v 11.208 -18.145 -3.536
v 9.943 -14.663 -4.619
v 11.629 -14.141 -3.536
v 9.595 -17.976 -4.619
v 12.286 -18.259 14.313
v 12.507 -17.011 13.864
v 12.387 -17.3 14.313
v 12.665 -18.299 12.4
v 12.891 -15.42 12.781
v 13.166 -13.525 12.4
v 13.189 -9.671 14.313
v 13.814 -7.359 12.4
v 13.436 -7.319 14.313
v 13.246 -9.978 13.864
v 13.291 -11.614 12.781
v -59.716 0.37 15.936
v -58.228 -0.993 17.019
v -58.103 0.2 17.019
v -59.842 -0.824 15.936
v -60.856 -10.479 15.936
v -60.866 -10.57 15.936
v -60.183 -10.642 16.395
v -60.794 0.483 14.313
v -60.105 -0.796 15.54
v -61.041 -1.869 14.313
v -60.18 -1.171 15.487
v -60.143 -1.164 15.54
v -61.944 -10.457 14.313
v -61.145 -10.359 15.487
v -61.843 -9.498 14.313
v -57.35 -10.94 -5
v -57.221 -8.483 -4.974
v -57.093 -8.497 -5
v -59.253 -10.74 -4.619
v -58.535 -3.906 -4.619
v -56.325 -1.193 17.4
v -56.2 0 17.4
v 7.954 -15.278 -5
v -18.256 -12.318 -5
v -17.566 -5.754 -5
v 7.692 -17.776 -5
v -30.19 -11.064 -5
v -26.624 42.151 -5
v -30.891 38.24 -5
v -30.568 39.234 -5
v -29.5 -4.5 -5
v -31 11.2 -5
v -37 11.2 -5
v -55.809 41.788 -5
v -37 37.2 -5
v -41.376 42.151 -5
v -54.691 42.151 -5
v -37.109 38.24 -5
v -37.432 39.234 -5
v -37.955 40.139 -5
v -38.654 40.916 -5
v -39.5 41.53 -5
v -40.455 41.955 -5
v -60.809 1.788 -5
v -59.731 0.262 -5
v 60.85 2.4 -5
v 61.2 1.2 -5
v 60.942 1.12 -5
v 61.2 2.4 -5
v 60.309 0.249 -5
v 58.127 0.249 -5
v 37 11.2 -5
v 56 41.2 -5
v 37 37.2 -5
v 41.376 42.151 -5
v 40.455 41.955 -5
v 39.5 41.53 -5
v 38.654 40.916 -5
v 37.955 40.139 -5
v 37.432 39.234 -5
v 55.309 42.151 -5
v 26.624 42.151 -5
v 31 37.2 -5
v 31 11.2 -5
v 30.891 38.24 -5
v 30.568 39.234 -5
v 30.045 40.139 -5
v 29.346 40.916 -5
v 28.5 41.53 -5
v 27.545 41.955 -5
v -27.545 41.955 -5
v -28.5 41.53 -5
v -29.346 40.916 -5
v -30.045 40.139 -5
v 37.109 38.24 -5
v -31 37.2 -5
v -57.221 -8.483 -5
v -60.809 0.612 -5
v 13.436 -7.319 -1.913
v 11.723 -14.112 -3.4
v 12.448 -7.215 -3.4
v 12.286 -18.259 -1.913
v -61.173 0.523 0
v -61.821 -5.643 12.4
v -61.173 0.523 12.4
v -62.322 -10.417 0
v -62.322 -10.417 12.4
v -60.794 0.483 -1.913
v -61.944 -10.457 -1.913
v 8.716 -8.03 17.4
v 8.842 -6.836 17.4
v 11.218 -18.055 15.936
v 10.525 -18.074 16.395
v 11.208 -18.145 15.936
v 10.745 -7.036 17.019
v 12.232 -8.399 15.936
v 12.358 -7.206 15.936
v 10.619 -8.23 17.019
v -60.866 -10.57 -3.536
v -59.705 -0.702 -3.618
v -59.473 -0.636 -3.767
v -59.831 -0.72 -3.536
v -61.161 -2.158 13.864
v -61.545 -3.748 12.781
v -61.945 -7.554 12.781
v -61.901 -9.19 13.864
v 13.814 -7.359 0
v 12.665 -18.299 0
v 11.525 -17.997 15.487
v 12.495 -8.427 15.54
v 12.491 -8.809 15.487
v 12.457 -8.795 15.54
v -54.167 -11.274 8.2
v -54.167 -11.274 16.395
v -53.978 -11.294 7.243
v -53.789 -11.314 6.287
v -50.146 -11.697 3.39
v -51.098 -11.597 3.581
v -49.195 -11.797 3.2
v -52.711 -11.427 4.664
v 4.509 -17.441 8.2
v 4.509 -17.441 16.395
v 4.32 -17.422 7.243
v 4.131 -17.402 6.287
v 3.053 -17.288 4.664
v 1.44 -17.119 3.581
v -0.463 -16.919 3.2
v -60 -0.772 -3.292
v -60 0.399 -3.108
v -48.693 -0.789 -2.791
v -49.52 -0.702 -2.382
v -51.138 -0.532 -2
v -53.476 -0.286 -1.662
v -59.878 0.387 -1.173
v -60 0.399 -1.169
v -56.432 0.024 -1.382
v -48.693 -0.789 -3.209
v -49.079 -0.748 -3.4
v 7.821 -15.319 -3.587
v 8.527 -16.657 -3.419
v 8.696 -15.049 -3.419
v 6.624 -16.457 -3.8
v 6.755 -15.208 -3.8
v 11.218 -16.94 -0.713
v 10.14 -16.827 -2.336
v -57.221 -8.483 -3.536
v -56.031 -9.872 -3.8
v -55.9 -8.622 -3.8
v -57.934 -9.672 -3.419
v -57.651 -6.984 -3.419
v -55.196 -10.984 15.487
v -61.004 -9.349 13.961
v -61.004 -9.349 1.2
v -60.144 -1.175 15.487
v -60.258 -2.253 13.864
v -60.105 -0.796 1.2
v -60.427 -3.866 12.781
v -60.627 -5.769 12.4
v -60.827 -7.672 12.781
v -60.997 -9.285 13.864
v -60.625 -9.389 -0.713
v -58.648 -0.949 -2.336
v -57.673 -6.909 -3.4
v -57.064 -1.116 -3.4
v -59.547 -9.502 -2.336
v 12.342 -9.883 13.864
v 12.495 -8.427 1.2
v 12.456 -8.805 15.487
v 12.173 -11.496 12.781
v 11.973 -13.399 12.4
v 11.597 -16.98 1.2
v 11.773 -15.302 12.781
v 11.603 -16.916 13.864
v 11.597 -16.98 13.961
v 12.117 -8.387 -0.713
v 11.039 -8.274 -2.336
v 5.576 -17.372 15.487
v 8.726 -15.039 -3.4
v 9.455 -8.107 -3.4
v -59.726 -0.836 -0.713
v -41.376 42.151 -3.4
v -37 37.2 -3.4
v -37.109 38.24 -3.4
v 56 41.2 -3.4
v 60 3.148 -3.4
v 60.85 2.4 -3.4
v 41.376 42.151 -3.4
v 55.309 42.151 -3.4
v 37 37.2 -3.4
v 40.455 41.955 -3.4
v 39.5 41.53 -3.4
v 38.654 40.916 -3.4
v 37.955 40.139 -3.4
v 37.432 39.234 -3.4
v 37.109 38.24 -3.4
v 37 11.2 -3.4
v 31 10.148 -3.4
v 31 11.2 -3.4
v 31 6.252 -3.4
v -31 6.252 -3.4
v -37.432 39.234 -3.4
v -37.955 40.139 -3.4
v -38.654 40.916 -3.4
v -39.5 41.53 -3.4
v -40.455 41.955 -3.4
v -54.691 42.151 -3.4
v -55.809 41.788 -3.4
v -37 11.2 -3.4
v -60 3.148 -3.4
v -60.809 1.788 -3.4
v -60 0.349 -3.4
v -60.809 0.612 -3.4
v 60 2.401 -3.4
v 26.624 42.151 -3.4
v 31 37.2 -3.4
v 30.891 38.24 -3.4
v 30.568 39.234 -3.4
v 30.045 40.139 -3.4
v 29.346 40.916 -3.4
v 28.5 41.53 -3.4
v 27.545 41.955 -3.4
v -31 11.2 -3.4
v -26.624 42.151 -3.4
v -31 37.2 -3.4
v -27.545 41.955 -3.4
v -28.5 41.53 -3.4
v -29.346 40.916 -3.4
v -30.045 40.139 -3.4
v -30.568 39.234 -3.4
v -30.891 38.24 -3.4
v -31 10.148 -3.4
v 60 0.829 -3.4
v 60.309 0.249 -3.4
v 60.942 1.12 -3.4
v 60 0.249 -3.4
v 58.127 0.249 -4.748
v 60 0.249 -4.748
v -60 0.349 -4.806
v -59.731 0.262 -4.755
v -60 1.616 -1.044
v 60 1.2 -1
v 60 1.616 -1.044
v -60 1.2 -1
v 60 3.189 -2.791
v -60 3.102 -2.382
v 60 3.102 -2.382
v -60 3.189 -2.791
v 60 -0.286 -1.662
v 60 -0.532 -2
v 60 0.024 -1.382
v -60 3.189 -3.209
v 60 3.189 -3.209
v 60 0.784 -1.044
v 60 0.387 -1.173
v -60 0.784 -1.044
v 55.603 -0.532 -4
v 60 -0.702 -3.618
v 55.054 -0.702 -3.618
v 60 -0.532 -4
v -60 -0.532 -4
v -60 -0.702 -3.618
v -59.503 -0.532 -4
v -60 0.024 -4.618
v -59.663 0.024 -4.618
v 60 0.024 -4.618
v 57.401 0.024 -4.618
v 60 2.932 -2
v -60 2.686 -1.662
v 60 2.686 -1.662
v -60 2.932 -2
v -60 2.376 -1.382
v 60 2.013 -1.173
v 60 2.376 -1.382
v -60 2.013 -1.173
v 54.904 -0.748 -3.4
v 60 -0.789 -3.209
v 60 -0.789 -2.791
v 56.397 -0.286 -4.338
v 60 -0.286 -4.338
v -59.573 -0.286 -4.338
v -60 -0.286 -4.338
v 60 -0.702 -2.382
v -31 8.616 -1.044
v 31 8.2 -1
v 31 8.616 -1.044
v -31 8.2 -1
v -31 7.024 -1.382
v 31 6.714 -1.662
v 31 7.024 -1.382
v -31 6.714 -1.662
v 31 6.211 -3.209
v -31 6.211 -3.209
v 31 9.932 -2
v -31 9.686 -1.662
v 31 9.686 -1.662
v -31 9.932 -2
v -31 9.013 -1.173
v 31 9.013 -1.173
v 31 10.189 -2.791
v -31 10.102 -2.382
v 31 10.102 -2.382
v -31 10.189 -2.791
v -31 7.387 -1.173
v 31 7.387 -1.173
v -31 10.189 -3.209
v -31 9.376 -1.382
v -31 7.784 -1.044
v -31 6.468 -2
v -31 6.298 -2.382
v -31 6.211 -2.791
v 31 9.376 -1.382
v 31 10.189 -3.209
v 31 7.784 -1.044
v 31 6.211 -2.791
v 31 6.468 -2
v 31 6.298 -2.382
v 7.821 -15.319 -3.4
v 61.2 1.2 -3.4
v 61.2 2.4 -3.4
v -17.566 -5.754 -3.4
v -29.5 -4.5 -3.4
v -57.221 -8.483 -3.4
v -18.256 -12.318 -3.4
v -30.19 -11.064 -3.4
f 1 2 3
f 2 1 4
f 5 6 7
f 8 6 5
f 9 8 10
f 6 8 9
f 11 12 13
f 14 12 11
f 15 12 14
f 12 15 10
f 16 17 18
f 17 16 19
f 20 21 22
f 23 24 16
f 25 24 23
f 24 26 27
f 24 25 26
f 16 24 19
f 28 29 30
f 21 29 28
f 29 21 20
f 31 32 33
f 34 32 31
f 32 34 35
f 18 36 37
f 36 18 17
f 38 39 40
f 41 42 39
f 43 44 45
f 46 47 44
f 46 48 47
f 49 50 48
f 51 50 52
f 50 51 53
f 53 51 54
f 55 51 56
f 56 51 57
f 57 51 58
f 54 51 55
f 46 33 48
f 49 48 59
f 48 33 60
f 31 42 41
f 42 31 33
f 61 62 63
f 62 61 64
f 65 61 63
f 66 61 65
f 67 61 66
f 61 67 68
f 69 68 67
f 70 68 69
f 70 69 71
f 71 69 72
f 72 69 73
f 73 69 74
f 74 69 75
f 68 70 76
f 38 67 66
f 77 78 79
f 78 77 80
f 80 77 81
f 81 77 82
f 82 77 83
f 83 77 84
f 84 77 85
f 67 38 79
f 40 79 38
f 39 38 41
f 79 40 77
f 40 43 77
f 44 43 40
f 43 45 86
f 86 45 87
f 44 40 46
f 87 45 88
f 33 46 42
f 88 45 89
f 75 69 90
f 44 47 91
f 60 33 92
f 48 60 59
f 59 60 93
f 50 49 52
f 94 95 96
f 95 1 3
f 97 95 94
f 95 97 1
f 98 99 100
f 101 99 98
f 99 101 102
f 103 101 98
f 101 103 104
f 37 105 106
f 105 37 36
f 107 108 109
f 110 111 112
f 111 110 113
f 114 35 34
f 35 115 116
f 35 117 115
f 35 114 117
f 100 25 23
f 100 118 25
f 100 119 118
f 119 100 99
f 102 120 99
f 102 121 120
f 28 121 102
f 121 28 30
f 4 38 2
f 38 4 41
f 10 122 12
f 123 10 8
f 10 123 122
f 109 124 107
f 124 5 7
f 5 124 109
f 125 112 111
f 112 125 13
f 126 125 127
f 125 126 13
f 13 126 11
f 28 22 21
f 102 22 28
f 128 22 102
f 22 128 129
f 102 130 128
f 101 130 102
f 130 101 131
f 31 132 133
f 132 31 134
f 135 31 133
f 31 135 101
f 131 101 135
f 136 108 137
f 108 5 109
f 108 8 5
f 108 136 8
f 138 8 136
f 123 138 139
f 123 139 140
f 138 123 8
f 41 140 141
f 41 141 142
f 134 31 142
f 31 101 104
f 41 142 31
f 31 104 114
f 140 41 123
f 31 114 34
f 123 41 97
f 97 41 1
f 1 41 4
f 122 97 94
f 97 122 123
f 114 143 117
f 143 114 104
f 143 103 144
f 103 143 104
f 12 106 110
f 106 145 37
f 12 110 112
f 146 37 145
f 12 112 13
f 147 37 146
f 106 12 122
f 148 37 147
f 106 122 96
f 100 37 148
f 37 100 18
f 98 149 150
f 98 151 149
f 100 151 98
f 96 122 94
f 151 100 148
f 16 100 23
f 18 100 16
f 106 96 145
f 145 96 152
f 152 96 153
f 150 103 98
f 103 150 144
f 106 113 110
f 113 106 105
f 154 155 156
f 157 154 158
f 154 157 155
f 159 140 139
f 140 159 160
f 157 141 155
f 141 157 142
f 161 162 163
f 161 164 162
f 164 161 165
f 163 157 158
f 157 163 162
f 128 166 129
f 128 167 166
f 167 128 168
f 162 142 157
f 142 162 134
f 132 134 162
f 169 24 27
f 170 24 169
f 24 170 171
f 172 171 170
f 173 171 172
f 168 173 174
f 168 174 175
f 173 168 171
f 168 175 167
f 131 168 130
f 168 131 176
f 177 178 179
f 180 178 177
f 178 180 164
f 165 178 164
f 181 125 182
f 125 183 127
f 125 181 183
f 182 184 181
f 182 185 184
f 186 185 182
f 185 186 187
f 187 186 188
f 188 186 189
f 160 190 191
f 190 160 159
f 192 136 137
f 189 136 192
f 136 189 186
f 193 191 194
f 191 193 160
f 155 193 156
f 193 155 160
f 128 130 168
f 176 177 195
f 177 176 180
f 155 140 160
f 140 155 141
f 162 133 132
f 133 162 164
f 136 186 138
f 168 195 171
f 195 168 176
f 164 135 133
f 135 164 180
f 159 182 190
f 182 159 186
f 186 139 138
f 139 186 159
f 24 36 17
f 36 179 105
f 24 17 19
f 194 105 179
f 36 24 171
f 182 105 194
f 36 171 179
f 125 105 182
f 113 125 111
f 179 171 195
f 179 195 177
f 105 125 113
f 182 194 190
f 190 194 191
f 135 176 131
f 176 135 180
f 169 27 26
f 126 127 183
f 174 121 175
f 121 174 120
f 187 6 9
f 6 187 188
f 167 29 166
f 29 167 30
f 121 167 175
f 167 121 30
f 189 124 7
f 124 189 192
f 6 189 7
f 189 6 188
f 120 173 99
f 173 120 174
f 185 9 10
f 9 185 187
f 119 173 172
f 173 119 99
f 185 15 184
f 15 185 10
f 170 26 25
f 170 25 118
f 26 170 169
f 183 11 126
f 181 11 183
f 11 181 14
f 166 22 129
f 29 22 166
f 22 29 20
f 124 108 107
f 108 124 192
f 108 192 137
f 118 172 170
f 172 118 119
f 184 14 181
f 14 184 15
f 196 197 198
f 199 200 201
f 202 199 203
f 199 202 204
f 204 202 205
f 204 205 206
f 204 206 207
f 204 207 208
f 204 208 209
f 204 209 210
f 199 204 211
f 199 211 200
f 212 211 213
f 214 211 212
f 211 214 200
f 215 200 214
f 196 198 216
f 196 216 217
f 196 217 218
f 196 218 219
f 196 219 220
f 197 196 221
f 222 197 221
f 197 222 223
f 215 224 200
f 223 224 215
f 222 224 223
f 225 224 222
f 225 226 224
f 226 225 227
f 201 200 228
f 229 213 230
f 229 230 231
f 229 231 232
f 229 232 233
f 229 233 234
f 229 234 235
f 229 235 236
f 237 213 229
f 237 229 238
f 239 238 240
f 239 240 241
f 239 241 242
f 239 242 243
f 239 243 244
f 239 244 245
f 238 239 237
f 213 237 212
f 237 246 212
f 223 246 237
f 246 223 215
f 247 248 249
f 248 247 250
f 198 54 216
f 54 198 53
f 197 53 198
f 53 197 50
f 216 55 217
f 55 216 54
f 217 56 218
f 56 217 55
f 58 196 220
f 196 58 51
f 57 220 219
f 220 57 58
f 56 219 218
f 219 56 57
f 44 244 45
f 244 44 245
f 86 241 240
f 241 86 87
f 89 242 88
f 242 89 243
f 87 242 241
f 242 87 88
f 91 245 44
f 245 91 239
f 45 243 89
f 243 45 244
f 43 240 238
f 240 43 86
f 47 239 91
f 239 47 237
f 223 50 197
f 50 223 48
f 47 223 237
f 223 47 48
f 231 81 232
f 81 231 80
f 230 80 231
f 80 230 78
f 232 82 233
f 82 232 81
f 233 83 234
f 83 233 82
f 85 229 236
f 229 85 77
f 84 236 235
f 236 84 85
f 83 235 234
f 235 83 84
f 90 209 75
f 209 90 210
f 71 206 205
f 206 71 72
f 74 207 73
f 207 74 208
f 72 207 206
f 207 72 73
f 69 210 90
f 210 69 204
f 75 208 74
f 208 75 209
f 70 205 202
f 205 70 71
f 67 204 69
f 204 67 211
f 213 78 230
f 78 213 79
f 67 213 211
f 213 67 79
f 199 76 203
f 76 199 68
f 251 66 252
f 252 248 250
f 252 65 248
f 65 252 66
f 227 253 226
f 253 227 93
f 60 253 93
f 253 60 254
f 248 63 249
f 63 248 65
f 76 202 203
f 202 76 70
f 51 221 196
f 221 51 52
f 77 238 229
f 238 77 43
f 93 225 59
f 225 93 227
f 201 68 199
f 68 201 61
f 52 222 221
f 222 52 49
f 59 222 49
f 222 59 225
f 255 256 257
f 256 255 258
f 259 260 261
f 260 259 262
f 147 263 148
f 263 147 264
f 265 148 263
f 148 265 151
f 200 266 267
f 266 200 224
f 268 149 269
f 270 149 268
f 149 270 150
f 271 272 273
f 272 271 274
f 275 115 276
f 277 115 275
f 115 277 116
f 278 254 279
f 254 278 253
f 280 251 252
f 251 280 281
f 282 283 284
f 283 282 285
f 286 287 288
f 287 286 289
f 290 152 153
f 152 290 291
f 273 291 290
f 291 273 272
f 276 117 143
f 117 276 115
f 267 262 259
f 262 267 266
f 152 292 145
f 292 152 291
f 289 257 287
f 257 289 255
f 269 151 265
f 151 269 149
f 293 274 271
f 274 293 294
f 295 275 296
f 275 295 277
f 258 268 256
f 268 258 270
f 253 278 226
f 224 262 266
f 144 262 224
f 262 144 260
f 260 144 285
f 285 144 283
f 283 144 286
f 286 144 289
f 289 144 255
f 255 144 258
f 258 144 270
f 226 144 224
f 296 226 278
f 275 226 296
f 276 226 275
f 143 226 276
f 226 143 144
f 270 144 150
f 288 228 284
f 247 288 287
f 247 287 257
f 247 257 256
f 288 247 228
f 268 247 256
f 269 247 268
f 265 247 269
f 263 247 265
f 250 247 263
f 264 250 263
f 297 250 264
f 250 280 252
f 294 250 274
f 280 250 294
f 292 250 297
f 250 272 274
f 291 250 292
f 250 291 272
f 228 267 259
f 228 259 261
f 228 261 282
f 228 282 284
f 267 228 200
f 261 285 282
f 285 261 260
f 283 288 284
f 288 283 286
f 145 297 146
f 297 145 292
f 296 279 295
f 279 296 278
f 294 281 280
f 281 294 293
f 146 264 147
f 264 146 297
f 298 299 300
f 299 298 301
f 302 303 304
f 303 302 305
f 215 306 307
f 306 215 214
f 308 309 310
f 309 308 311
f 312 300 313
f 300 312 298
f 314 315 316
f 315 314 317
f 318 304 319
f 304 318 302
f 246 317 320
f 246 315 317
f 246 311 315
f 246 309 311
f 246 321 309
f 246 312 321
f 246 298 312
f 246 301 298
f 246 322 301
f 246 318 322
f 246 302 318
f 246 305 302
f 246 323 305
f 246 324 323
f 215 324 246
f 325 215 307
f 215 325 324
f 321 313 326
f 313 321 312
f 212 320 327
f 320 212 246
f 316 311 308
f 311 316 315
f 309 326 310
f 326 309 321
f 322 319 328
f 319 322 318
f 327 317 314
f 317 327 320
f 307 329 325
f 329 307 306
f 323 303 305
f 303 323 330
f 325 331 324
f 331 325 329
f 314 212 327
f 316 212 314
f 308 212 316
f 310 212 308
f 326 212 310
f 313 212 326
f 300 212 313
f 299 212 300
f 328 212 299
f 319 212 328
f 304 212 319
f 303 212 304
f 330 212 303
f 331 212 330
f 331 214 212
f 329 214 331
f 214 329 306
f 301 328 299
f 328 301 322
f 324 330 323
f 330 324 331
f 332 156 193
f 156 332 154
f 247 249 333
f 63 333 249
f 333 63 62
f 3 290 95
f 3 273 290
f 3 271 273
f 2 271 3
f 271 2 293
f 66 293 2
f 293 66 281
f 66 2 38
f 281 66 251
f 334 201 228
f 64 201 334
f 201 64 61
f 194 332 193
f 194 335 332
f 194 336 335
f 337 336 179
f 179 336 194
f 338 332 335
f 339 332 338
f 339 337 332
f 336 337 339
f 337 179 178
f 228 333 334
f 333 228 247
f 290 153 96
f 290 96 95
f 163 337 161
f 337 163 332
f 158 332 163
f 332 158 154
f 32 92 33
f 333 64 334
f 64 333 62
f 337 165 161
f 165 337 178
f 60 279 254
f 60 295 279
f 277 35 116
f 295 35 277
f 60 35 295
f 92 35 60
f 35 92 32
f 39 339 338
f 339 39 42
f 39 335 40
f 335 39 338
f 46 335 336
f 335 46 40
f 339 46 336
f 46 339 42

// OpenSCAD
/* $fn = 100; */
/* inner_width = 144; // landscape */
inner_width = 73; // portrait
inner_height = 20;
insert_width = 120;
insert_depth = 40;
float_left = true;
charger_hole = 5;
charger_hole_depth = 6.6;
charger_hole_width = 12;
rad = 5;
thickness = 1.2;
insert_thickness = 1.6;
depth = 11;
width = inner_width + (thickness * 2) - (2 * rad);
height = inner_height + (thickness * 2) - (2 * rad);
rant = 7;
over = 70;
/* bend_angle=5; */
bend_angle=0; // prints better
side_angle=6;
cd_sensor_l=23;
cd_sensor_w=6;
to_the_left = float_left ? -(insert_width - inner_width) / 2 : 0;

module baseblock(w=55, h=96, r=5, t=9) {
  hull() {
    cylinder(t, r=r);
    translate([w, 0, 0]) {
      translate([0, h, 0]) cylinder(t, r=r);
      cylinder(t, r=r);
      cylinder(t, r=r);
    }
    translate([0, h, 0]) cylinder(t, r=r);
  }
}



module phonecase() {
  rrant = rant * 2;
  hrant = rant;
  difference() {
    baseblock(w=width, h=height, t=depth);
    hull() {
      translate([thickness, thickness, thickness])
        baseblock(w=width - (thickness * 2), h=height * 2, t=depth - (thickness * 2));
      translate([thickness + rrant, thickness + rrant, thickness])
        baseblock(w=width - ((thickness + rrant) * 2), h=height - (thickness * 2), t=depth);
    }
    translate([width * 1.5, height+rad, rad+thickness])
      rotate(-90, [0, 1, 0])
        cylinder(width * 2, r=rad);
    translate([thickness + hrant, thickness + rrant + over, -thickness])
        baseblock(w=width - ((thickness + hrant) * 2), h=height - (thickness * 2), t=depth);
  }
}
module phonecase_gap() {
  translate([0, -rad, 0])
    translate([to_the_left,0,0])
      cube([width,insert_thickness,depth]);
}

module insert() {

  module sensor_slot() {
      cube([cd_sensor_w, insert_depth, insert_thickness]);
      /* translate([2.5, insert_depth-10, 0]) */
        /* cylinder(r=5, h=insert_thickness); */
      difference() {
        translate([-5, insert_depth-14, 0])
          cube([cd_sensor_w+10, 10, insert_thickness]);
        translate([-5, insert_depth-14, 0])
          cylinder(r=5, h=insert_thickness, $fn=30);
        translate([5+cd_sensor_w, insert_depth-14, 0])
          cylinder(r=5, h=insert_thickness, $fn=30);
      }
  }

  module lock_teeth(size=5) {
    intersection() {
      cube([insert_width, 50, size]);
      translate([0,-size / 2,0])
        rotate(-25, [1,0,0])
      cube([insert_width, 50, size]);
    }
  }

  render() {
    difference() {
      hull() {
        cylinder(10, h=insert_thickness);
        translate([insert_width, 0, 0]) cylinder(10, h=insert_thickness);
        translate([5, insert_depth, 0]) cylinder(10, h=insert_thickness);
        translate([insert_width-5, insert_depth, 0]) cylinder(10, h=insert_thickness);
      }
      translate([cd_sensor_l, 10, 0])
        sensor_slot();
      translate([insert_width - cd_sensor_l - cd_sensor_w, 10, 0])
        sensor_slot();
    }
  }
  limit_r=2;
  translate([0,0, limit_r])
    rotate(90, [0,1,0])
      cylinder(insert_width, r=limit_r, $fn=30);

  translate([cd_sensor_l + cd_sensor_w, 7, limit_r])
    rotate(90, [0,1,0])
      cylinder(insert_width-(2*cd_sensor_l)-(2*cd_sensor_w), r=limit_r, $fn=30);
  /* translate([0,7, insert_thickness]) */
  /*   lock_teeth(2); */
  /* translate([0,14, insert_thickness]) */
  /*   lock_teeth(1.6); */
  /* translate([0,21, insert_thickness]) */
  /*   lock_teeth(1.2); */
}

module insert_gap() {
  cube([insert_width+thickness, thickness, insert_thickness]);
}

translate([-width / 2,0,0]) {
  difference() {
    union() {
      translate([to_the_left,0,0]) {
        rotate(90, [1,0,0]) {
          rotate(side_angle, [0,-1,0])
            rotate(bend_angle, [-1,0,0])
              phonecase();
        }
      }

      translate([0-((insert_width - width) / 2), thickness, -rad])
        insert();

      // fill gap between insert and phone case
      hull() {
        rotate(90, [1,0,0]) {
          rotate(side_angle, [0,-1,0])
            phonecase_gap();
        }
        translate([0-((insert_width - width) / 2), thickness, -rad])
          insert_gap();
      }
    }

    translate([to_the_left + (width/2) - (charger_hole_width/2),-(depth/2)+1,-(charger_hole+1)])
      rotate(90, [1,0,0])
        rotate(side_angle, [0,-1,0])
          cube([charger_hole_width, charger_hole, charger_hole_depth]);
  }

}
